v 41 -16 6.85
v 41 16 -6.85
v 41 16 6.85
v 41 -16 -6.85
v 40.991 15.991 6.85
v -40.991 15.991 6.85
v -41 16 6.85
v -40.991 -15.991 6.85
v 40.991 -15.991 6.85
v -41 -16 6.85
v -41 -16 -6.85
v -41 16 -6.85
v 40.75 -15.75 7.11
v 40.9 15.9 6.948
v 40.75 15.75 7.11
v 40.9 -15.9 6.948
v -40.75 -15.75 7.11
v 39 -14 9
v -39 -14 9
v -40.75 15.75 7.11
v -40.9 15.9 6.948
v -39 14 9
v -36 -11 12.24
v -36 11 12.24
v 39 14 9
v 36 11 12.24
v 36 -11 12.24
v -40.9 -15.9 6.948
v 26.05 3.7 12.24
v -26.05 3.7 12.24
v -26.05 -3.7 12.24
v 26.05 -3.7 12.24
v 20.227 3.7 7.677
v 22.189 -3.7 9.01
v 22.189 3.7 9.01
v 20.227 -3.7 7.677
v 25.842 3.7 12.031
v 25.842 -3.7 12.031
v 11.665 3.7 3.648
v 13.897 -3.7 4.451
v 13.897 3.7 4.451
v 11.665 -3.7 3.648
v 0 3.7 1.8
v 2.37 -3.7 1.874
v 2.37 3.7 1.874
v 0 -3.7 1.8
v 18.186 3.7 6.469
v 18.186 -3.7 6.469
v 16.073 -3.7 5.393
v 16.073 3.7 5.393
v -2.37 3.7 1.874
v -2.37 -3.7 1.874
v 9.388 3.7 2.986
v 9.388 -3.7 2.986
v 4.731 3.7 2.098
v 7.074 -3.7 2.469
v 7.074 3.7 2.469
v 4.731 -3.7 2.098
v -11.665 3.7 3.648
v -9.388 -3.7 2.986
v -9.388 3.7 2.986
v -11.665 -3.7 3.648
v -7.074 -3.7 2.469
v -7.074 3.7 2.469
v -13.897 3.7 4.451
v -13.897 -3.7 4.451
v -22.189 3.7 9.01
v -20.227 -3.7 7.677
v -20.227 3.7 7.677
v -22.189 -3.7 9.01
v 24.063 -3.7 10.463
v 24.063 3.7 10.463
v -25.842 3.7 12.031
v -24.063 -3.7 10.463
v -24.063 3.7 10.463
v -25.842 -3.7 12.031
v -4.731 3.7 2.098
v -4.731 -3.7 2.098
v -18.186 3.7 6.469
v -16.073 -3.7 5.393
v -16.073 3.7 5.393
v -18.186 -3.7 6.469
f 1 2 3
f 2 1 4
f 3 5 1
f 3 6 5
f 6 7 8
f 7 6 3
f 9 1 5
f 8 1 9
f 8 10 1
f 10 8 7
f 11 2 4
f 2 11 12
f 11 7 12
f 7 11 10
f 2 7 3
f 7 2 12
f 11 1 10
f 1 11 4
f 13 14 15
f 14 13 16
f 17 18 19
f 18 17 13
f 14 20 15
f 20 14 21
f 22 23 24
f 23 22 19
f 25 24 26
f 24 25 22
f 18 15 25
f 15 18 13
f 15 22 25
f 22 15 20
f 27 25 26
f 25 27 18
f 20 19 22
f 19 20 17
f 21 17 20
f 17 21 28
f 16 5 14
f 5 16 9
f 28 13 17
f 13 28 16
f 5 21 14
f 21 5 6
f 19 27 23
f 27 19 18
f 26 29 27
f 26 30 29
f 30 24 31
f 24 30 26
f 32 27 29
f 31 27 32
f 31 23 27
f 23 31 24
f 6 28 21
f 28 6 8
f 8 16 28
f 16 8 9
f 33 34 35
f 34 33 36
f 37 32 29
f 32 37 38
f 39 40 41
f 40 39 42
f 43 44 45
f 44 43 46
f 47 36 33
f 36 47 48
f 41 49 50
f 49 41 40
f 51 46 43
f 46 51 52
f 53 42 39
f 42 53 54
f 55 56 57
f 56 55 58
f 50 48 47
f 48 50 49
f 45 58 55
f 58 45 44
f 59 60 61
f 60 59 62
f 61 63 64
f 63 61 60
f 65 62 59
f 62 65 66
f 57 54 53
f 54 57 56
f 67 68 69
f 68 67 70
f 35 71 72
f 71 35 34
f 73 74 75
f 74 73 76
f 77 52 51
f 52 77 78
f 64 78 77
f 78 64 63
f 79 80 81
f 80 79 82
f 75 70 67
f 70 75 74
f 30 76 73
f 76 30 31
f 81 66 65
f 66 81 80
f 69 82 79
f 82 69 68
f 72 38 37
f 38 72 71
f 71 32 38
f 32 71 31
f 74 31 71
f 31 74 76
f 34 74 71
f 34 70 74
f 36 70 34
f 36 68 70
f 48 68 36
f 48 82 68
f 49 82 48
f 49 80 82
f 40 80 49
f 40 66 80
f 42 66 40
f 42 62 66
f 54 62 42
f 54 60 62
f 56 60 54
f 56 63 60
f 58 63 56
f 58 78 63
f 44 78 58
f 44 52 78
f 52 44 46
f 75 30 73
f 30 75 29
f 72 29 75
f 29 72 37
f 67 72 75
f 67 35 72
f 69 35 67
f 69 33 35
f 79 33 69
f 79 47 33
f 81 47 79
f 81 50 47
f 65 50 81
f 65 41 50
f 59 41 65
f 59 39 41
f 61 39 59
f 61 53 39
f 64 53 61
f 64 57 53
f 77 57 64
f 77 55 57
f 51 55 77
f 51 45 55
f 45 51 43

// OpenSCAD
coin_diameter=75;
coin_height=6.9;

stand_x=82;
stand_top_x=72;
stand_y=32;
stand_top_y=22;
stand_z1=13.7;
stand_z2=19.1;
stand_depth=7.5;

e=0.01;
slack=0.25;
$fn=100;

difference() {
    // stand
    union() {
        cube([stand_x, stand_y, stand_z1], center=true);

        translate([0, 0, stand_z1/2-e])
        linear_extrude(height=stand_z2-stand_z1, scale=[stand_top_x/stand_x, stand_top_y/stand_y])
        square([stand_x, stand_y], center=true);
    }

    // coin
    translate([0, 0, coin_diameter/2 + stand_z2/2 - stand_depth])
    rotate([90, 0, 0])
    cylinder(d=coin_diameter+2*slack, h=coin_height+2*slack, center=true);
}
